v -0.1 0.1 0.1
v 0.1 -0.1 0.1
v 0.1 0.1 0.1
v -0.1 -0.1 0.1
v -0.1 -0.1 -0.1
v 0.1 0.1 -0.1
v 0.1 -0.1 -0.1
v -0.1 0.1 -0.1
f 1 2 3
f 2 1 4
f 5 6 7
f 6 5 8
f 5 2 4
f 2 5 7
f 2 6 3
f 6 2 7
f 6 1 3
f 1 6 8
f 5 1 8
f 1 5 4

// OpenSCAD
color([0.3, 0.3, 0.5])
translate([-0.1,-0.1,-0.1])
cube([.2, .2, .2], false);
